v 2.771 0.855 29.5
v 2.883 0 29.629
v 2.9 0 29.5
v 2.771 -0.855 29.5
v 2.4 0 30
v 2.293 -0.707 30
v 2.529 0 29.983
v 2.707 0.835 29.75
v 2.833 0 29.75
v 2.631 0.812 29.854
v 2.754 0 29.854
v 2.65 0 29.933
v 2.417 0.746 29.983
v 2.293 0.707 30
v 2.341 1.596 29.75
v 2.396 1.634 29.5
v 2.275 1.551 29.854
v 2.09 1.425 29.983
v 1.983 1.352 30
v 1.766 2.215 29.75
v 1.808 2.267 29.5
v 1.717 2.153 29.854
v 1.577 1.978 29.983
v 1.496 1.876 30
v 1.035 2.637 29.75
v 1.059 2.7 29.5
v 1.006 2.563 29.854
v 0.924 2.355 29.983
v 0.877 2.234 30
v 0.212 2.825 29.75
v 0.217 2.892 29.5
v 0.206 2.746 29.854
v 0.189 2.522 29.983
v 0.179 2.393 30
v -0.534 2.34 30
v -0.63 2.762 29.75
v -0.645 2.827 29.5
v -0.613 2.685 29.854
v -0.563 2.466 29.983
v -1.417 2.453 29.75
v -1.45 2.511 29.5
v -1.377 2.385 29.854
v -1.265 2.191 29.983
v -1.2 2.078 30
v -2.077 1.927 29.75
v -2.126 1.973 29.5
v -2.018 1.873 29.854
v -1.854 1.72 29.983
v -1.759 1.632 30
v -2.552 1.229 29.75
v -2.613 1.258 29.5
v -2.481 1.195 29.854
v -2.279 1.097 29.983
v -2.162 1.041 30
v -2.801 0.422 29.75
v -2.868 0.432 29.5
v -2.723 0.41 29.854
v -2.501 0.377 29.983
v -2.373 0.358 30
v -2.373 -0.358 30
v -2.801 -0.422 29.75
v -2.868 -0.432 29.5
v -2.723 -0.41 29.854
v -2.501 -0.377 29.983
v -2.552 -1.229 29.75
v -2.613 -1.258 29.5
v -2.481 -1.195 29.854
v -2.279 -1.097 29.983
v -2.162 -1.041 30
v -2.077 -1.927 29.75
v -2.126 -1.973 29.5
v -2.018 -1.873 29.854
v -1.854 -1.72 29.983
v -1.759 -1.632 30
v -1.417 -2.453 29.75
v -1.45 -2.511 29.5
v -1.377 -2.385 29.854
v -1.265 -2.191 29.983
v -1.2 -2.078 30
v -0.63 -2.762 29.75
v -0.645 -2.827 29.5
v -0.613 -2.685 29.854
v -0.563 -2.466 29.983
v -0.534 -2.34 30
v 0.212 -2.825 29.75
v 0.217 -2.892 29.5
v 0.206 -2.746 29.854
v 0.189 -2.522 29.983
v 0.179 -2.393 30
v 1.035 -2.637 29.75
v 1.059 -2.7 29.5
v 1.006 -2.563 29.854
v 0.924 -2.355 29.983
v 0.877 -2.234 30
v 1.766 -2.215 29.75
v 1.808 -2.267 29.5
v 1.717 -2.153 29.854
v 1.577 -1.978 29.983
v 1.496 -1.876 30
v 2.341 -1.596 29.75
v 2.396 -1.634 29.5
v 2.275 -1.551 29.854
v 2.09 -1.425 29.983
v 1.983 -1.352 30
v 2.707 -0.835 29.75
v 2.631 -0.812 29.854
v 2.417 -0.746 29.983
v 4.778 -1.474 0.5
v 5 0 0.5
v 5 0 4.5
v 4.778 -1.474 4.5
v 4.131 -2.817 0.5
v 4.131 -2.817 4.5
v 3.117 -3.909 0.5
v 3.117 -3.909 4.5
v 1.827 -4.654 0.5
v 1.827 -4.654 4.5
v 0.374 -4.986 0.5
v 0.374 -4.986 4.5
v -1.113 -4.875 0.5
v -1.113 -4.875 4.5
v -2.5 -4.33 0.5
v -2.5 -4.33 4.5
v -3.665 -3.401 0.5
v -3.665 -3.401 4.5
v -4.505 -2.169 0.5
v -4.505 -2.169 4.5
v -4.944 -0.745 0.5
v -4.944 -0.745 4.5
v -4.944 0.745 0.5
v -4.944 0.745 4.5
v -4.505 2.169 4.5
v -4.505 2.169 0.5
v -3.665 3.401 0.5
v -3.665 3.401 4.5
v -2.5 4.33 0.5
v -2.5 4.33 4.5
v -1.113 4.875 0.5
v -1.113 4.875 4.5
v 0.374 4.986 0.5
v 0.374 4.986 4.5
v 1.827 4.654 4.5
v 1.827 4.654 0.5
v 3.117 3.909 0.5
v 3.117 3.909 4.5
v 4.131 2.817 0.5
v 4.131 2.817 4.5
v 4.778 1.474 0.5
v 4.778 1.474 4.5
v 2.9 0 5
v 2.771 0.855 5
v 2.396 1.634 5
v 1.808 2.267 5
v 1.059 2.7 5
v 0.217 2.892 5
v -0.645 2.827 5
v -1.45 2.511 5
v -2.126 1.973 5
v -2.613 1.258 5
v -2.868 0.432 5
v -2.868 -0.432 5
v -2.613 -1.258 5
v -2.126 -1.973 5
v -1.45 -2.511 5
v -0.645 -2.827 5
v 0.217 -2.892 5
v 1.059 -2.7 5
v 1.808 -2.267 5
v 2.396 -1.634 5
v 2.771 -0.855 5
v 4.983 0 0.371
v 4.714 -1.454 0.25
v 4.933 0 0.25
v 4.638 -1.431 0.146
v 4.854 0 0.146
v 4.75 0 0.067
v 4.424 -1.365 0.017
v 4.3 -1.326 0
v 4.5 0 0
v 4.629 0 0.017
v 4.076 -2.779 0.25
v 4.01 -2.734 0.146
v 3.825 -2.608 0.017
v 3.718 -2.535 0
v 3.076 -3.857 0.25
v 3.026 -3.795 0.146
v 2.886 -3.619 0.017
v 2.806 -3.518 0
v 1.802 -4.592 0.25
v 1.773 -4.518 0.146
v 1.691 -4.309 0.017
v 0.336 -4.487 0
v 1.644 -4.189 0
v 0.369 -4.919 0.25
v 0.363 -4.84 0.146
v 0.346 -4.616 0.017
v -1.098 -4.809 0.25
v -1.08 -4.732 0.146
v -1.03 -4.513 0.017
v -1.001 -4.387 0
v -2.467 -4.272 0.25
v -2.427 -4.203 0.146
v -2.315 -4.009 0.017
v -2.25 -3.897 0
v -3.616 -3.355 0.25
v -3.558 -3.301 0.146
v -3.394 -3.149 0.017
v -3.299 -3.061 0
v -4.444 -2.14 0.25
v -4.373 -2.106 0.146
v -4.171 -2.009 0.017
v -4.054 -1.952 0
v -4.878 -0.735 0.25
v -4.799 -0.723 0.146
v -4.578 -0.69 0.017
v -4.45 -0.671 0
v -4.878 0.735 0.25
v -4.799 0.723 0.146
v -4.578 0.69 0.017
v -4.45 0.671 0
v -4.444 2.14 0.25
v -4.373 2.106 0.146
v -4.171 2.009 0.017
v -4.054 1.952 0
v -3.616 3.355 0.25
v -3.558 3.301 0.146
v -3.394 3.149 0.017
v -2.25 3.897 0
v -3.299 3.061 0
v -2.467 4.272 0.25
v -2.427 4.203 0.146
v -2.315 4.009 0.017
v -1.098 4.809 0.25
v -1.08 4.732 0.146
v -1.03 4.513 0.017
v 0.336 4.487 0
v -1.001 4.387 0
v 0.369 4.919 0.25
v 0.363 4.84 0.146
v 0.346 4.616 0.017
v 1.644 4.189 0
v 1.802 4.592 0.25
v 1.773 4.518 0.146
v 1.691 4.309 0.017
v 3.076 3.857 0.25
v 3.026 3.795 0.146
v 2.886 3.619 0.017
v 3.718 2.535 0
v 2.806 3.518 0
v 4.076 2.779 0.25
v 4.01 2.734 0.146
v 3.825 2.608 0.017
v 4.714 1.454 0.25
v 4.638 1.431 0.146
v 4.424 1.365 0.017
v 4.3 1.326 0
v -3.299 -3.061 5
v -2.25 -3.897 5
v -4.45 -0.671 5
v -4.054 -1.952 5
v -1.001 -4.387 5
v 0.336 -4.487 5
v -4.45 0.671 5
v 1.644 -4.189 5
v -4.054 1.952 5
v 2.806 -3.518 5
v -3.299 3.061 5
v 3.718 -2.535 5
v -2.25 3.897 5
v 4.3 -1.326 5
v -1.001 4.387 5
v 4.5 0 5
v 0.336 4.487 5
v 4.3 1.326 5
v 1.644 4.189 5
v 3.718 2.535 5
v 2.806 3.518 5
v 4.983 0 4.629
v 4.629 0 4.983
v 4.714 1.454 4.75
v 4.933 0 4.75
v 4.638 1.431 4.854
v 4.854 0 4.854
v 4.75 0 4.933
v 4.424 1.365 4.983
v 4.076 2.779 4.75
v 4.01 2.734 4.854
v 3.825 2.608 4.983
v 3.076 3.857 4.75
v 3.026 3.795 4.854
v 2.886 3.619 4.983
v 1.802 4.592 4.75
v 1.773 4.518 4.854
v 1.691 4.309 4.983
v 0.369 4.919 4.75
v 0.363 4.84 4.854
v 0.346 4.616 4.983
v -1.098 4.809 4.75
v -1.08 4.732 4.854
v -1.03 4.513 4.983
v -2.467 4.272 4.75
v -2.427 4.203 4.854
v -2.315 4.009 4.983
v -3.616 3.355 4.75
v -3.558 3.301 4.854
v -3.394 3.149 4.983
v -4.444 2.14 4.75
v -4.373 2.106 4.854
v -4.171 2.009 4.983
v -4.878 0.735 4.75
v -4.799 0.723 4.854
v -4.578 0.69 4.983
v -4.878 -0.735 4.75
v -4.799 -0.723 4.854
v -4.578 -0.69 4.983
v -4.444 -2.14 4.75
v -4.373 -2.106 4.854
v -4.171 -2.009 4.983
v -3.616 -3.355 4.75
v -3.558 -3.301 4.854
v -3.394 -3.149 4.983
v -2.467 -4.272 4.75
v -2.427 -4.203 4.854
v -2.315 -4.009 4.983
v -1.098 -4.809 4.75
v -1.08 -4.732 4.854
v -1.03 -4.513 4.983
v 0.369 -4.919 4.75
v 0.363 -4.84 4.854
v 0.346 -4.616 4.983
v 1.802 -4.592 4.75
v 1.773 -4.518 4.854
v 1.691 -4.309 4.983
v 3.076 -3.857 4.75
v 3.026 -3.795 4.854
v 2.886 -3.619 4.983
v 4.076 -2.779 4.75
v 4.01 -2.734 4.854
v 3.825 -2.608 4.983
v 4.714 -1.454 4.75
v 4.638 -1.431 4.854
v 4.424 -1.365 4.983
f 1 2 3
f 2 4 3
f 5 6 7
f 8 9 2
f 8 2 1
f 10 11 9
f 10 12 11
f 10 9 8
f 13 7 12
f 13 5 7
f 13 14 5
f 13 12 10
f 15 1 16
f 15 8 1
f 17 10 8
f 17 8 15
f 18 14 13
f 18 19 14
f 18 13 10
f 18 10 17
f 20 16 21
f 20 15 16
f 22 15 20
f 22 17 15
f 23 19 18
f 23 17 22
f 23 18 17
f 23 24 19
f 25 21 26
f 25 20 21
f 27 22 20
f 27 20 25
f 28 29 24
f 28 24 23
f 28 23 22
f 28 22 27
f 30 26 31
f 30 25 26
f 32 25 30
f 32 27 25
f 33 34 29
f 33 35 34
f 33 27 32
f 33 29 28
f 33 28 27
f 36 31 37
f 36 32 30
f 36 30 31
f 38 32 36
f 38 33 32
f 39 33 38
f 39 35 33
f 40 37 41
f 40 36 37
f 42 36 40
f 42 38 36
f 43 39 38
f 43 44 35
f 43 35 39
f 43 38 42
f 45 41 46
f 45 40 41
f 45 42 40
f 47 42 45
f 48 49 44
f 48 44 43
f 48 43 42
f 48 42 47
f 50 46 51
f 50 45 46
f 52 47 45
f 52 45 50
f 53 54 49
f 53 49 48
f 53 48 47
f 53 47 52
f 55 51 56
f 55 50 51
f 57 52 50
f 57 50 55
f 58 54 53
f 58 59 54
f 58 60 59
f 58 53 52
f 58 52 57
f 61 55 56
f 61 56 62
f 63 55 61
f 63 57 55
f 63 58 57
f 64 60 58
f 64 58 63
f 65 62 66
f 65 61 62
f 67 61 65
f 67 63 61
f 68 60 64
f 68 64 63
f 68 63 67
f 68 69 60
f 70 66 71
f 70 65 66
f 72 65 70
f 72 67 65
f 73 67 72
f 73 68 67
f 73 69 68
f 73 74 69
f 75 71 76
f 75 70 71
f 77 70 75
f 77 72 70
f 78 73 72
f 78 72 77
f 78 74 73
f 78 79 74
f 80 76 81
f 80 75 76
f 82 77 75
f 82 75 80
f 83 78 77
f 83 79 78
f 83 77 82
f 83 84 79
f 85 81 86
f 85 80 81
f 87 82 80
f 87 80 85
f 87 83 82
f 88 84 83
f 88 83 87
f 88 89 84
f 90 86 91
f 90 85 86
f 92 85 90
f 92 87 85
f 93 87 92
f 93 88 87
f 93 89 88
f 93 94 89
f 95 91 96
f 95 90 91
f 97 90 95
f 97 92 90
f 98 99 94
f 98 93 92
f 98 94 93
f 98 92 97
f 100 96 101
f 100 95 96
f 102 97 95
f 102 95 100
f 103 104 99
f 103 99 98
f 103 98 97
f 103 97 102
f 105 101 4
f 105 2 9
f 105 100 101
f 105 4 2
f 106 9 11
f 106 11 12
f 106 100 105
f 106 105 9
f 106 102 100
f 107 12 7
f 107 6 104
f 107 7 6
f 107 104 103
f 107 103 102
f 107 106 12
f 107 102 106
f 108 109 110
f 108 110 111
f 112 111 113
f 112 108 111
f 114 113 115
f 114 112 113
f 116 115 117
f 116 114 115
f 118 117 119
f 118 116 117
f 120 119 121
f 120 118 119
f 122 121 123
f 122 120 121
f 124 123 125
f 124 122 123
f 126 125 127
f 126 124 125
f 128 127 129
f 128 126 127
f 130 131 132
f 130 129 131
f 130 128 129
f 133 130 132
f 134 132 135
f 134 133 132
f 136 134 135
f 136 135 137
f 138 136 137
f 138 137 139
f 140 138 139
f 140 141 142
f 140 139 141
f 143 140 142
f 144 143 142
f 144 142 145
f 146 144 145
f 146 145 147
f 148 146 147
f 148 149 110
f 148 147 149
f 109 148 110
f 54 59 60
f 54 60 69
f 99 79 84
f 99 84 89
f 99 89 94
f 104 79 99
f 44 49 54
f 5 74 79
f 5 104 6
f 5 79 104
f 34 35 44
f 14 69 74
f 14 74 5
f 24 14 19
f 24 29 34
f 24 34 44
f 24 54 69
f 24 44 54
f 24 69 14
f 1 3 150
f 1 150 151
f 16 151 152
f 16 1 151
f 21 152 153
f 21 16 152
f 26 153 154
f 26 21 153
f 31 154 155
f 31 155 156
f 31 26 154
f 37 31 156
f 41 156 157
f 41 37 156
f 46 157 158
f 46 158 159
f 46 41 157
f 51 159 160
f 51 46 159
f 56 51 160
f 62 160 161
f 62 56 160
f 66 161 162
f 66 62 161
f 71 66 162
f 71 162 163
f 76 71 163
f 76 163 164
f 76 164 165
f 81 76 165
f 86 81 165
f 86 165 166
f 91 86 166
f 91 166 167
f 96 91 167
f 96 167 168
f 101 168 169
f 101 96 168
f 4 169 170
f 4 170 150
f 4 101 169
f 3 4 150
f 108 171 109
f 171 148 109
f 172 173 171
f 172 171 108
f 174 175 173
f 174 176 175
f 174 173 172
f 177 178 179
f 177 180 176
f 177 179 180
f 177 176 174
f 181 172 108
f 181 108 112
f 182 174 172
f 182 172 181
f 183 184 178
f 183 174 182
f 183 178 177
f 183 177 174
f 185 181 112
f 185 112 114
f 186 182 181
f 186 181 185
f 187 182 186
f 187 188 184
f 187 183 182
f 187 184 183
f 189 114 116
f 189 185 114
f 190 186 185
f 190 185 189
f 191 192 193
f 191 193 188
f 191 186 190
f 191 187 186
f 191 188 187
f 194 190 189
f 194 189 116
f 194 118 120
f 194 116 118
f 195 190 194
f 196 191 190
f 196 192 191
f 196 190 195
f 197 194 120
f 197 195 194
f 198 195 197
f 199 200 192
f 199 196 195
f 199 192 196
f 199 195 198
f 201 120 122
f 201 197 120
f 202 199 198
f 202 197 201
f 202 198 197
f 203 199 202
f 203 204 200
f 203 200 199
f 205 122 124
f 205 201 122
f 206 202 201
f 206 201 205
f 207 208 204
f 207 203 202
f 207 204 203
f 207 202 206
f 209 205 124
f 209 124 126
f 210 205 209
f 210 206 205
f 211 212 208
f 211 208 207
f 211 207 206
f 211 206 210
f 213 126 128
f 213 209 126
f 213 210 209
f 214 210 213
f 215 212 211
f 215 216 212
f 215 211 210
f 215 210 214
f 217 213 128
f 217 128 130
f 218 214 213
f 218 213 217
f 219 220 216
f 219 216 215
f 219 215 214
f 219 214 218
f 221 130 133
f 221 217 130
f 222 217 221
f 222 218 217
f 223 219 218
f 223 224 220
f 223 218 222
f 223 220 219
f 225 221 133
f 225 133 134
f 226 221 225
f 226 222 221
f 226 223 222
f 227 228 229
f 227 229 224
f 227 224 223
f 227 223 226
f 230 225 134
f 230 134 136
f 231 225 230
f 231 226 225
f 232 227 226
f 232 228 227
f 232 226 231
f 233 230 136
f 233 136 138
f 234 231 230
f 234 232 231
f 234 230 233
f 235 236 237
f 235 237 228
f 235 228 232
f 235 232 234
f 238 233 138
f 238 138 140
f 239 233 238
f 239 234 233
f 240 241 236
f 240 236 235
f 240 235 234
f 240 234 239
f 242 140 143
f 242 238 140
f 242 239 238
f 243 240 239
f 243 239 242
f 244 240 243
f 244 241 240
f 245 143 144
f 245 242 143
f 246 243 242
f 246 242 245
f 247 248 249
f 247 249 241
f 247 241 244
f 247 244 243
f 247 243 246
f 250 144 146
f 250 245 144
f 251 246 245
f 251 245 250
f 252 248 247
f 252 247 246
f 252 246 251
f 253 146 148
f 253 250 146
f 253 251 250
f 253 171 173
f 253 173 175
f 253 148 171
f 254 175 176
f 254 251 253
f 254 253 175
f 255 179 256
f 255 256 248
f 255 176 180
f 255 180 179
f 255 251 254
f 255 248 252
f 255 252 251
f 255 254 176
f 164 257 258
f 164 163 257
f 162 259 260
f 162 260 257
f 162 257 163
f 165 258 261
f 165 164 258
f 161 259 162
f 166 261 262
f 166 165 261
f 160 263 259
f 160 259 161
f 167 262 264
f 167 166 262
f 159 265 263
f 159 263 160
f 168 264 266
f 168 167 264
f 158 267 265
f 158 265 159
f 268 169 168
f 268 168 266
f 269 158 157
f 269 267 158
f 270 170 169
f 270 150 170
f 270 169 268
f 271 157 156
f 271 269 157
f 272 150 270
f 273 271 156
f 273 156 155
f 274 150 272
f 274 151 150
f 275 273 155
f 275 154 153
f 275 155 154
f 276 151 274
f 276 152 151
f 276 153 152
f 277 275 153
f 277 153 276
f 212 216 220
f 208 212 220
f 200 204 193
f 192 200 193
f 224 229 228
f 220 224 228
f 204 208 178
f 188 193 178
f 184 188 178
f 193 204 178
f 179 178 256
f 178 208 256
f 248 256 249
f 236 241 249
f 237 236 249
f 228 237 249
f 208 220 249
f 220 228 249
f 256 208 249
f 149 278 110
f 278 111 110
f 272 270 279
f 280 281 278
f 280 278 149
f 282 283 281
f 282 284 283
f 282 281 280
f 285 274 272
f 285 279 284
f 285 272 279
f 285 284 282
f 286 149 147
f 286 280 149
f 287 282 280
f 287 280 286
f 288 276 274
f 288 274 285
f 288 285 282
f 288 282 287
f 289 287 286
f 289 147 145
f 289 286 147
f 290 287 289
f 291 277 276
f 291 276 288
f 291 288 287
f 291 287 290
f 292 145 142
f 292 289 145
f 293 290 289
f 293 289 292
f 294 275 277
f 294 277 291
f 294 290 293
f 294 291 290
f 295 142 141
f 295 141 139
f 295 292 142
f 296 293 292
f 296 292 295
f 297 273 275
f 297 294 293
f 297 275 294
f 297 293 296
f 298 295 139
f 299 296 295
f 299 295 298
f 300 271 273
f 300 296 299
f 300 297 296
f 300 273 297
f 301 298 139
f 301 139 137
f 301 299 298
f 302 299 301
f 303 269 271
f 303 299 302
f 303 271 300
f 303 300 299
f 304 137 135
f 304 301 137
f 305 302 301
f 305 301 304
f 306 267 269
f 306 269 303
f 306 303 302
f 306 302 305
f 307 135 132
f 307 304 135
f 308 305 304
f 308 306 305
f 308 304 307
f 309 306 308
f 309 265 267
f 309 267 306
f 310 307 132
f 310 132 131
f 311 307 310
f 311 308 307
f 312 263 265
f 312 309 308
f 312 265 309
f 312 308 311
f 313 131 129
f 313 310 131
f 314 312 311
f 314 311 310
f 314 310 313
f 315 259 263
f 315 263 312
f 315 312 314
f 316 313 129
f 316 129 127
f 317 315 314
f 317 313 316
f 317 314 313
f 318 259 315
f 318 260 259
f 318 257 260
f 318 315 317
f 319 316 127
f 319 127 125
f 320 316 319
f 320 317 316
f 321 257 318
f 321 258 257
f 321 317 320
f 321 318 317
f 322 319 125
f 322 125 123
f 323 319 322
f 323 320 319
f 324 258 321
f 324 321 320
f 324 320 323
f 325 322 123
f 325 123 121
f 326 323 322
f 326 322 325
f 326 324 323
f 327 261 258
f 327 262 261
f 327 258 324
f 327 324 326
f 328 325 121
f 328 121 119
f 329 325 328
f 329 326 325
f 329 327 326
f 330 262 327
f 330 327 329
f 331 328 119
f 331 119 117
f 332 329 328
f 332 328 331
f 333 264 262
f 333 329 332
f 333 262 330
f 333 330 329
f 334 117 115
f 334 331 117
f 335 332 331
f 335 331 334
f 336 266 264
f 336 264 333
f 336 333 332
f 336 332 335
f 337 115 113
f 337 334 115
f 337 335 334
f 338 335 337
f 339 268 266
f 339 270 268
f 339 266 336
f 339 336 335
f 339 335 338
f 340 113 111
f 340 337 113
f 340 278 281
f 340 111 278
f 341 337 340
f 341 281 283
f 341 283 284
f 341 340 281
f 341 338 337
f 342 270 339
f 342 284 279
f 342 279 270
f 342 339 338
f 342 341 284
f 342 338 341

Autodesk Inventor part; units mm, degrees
ref_plane "YZ Plane" through (0, 0, 0) normal (1, 0, 0) x (0, 1, 0)
ref_plane "XZ Plane" through (0, 0, 0) normal (0, 1, 0) x (-1, 0, 0)
ref_plane "XY Plane" through (0, 0, 0) normal (0, 0, 1) x (1, 0, 0)
sketch "Boceto1" plane through (0, 0, 0) normal (0, 0, 1) x (1, 0, 0)
  circle A0 centre (0, 0) radius 5
  dimension "d0" = 10
extrude "Extrusión1" add sketch "Boceto1" along normal blind 30
sketch "Boceto2" plane through (0, 0, 30) normal (0, 0, 1) x (1, 0, 0)
  circle A0 centre (0, 0) radius 5 projected
  circle A1 centre (0, 0) radius 2.9
  dimension "d3" = 5.8
extrude "Extrusión2" cut sketch "Boceto2" against normal blind 25
fillet "Empalme1" radius 0.5 3 edges at (-2.9, 0, 30) (-5, 0, 5) (-5, 0, 0)
properties part number "pern frontissa"
